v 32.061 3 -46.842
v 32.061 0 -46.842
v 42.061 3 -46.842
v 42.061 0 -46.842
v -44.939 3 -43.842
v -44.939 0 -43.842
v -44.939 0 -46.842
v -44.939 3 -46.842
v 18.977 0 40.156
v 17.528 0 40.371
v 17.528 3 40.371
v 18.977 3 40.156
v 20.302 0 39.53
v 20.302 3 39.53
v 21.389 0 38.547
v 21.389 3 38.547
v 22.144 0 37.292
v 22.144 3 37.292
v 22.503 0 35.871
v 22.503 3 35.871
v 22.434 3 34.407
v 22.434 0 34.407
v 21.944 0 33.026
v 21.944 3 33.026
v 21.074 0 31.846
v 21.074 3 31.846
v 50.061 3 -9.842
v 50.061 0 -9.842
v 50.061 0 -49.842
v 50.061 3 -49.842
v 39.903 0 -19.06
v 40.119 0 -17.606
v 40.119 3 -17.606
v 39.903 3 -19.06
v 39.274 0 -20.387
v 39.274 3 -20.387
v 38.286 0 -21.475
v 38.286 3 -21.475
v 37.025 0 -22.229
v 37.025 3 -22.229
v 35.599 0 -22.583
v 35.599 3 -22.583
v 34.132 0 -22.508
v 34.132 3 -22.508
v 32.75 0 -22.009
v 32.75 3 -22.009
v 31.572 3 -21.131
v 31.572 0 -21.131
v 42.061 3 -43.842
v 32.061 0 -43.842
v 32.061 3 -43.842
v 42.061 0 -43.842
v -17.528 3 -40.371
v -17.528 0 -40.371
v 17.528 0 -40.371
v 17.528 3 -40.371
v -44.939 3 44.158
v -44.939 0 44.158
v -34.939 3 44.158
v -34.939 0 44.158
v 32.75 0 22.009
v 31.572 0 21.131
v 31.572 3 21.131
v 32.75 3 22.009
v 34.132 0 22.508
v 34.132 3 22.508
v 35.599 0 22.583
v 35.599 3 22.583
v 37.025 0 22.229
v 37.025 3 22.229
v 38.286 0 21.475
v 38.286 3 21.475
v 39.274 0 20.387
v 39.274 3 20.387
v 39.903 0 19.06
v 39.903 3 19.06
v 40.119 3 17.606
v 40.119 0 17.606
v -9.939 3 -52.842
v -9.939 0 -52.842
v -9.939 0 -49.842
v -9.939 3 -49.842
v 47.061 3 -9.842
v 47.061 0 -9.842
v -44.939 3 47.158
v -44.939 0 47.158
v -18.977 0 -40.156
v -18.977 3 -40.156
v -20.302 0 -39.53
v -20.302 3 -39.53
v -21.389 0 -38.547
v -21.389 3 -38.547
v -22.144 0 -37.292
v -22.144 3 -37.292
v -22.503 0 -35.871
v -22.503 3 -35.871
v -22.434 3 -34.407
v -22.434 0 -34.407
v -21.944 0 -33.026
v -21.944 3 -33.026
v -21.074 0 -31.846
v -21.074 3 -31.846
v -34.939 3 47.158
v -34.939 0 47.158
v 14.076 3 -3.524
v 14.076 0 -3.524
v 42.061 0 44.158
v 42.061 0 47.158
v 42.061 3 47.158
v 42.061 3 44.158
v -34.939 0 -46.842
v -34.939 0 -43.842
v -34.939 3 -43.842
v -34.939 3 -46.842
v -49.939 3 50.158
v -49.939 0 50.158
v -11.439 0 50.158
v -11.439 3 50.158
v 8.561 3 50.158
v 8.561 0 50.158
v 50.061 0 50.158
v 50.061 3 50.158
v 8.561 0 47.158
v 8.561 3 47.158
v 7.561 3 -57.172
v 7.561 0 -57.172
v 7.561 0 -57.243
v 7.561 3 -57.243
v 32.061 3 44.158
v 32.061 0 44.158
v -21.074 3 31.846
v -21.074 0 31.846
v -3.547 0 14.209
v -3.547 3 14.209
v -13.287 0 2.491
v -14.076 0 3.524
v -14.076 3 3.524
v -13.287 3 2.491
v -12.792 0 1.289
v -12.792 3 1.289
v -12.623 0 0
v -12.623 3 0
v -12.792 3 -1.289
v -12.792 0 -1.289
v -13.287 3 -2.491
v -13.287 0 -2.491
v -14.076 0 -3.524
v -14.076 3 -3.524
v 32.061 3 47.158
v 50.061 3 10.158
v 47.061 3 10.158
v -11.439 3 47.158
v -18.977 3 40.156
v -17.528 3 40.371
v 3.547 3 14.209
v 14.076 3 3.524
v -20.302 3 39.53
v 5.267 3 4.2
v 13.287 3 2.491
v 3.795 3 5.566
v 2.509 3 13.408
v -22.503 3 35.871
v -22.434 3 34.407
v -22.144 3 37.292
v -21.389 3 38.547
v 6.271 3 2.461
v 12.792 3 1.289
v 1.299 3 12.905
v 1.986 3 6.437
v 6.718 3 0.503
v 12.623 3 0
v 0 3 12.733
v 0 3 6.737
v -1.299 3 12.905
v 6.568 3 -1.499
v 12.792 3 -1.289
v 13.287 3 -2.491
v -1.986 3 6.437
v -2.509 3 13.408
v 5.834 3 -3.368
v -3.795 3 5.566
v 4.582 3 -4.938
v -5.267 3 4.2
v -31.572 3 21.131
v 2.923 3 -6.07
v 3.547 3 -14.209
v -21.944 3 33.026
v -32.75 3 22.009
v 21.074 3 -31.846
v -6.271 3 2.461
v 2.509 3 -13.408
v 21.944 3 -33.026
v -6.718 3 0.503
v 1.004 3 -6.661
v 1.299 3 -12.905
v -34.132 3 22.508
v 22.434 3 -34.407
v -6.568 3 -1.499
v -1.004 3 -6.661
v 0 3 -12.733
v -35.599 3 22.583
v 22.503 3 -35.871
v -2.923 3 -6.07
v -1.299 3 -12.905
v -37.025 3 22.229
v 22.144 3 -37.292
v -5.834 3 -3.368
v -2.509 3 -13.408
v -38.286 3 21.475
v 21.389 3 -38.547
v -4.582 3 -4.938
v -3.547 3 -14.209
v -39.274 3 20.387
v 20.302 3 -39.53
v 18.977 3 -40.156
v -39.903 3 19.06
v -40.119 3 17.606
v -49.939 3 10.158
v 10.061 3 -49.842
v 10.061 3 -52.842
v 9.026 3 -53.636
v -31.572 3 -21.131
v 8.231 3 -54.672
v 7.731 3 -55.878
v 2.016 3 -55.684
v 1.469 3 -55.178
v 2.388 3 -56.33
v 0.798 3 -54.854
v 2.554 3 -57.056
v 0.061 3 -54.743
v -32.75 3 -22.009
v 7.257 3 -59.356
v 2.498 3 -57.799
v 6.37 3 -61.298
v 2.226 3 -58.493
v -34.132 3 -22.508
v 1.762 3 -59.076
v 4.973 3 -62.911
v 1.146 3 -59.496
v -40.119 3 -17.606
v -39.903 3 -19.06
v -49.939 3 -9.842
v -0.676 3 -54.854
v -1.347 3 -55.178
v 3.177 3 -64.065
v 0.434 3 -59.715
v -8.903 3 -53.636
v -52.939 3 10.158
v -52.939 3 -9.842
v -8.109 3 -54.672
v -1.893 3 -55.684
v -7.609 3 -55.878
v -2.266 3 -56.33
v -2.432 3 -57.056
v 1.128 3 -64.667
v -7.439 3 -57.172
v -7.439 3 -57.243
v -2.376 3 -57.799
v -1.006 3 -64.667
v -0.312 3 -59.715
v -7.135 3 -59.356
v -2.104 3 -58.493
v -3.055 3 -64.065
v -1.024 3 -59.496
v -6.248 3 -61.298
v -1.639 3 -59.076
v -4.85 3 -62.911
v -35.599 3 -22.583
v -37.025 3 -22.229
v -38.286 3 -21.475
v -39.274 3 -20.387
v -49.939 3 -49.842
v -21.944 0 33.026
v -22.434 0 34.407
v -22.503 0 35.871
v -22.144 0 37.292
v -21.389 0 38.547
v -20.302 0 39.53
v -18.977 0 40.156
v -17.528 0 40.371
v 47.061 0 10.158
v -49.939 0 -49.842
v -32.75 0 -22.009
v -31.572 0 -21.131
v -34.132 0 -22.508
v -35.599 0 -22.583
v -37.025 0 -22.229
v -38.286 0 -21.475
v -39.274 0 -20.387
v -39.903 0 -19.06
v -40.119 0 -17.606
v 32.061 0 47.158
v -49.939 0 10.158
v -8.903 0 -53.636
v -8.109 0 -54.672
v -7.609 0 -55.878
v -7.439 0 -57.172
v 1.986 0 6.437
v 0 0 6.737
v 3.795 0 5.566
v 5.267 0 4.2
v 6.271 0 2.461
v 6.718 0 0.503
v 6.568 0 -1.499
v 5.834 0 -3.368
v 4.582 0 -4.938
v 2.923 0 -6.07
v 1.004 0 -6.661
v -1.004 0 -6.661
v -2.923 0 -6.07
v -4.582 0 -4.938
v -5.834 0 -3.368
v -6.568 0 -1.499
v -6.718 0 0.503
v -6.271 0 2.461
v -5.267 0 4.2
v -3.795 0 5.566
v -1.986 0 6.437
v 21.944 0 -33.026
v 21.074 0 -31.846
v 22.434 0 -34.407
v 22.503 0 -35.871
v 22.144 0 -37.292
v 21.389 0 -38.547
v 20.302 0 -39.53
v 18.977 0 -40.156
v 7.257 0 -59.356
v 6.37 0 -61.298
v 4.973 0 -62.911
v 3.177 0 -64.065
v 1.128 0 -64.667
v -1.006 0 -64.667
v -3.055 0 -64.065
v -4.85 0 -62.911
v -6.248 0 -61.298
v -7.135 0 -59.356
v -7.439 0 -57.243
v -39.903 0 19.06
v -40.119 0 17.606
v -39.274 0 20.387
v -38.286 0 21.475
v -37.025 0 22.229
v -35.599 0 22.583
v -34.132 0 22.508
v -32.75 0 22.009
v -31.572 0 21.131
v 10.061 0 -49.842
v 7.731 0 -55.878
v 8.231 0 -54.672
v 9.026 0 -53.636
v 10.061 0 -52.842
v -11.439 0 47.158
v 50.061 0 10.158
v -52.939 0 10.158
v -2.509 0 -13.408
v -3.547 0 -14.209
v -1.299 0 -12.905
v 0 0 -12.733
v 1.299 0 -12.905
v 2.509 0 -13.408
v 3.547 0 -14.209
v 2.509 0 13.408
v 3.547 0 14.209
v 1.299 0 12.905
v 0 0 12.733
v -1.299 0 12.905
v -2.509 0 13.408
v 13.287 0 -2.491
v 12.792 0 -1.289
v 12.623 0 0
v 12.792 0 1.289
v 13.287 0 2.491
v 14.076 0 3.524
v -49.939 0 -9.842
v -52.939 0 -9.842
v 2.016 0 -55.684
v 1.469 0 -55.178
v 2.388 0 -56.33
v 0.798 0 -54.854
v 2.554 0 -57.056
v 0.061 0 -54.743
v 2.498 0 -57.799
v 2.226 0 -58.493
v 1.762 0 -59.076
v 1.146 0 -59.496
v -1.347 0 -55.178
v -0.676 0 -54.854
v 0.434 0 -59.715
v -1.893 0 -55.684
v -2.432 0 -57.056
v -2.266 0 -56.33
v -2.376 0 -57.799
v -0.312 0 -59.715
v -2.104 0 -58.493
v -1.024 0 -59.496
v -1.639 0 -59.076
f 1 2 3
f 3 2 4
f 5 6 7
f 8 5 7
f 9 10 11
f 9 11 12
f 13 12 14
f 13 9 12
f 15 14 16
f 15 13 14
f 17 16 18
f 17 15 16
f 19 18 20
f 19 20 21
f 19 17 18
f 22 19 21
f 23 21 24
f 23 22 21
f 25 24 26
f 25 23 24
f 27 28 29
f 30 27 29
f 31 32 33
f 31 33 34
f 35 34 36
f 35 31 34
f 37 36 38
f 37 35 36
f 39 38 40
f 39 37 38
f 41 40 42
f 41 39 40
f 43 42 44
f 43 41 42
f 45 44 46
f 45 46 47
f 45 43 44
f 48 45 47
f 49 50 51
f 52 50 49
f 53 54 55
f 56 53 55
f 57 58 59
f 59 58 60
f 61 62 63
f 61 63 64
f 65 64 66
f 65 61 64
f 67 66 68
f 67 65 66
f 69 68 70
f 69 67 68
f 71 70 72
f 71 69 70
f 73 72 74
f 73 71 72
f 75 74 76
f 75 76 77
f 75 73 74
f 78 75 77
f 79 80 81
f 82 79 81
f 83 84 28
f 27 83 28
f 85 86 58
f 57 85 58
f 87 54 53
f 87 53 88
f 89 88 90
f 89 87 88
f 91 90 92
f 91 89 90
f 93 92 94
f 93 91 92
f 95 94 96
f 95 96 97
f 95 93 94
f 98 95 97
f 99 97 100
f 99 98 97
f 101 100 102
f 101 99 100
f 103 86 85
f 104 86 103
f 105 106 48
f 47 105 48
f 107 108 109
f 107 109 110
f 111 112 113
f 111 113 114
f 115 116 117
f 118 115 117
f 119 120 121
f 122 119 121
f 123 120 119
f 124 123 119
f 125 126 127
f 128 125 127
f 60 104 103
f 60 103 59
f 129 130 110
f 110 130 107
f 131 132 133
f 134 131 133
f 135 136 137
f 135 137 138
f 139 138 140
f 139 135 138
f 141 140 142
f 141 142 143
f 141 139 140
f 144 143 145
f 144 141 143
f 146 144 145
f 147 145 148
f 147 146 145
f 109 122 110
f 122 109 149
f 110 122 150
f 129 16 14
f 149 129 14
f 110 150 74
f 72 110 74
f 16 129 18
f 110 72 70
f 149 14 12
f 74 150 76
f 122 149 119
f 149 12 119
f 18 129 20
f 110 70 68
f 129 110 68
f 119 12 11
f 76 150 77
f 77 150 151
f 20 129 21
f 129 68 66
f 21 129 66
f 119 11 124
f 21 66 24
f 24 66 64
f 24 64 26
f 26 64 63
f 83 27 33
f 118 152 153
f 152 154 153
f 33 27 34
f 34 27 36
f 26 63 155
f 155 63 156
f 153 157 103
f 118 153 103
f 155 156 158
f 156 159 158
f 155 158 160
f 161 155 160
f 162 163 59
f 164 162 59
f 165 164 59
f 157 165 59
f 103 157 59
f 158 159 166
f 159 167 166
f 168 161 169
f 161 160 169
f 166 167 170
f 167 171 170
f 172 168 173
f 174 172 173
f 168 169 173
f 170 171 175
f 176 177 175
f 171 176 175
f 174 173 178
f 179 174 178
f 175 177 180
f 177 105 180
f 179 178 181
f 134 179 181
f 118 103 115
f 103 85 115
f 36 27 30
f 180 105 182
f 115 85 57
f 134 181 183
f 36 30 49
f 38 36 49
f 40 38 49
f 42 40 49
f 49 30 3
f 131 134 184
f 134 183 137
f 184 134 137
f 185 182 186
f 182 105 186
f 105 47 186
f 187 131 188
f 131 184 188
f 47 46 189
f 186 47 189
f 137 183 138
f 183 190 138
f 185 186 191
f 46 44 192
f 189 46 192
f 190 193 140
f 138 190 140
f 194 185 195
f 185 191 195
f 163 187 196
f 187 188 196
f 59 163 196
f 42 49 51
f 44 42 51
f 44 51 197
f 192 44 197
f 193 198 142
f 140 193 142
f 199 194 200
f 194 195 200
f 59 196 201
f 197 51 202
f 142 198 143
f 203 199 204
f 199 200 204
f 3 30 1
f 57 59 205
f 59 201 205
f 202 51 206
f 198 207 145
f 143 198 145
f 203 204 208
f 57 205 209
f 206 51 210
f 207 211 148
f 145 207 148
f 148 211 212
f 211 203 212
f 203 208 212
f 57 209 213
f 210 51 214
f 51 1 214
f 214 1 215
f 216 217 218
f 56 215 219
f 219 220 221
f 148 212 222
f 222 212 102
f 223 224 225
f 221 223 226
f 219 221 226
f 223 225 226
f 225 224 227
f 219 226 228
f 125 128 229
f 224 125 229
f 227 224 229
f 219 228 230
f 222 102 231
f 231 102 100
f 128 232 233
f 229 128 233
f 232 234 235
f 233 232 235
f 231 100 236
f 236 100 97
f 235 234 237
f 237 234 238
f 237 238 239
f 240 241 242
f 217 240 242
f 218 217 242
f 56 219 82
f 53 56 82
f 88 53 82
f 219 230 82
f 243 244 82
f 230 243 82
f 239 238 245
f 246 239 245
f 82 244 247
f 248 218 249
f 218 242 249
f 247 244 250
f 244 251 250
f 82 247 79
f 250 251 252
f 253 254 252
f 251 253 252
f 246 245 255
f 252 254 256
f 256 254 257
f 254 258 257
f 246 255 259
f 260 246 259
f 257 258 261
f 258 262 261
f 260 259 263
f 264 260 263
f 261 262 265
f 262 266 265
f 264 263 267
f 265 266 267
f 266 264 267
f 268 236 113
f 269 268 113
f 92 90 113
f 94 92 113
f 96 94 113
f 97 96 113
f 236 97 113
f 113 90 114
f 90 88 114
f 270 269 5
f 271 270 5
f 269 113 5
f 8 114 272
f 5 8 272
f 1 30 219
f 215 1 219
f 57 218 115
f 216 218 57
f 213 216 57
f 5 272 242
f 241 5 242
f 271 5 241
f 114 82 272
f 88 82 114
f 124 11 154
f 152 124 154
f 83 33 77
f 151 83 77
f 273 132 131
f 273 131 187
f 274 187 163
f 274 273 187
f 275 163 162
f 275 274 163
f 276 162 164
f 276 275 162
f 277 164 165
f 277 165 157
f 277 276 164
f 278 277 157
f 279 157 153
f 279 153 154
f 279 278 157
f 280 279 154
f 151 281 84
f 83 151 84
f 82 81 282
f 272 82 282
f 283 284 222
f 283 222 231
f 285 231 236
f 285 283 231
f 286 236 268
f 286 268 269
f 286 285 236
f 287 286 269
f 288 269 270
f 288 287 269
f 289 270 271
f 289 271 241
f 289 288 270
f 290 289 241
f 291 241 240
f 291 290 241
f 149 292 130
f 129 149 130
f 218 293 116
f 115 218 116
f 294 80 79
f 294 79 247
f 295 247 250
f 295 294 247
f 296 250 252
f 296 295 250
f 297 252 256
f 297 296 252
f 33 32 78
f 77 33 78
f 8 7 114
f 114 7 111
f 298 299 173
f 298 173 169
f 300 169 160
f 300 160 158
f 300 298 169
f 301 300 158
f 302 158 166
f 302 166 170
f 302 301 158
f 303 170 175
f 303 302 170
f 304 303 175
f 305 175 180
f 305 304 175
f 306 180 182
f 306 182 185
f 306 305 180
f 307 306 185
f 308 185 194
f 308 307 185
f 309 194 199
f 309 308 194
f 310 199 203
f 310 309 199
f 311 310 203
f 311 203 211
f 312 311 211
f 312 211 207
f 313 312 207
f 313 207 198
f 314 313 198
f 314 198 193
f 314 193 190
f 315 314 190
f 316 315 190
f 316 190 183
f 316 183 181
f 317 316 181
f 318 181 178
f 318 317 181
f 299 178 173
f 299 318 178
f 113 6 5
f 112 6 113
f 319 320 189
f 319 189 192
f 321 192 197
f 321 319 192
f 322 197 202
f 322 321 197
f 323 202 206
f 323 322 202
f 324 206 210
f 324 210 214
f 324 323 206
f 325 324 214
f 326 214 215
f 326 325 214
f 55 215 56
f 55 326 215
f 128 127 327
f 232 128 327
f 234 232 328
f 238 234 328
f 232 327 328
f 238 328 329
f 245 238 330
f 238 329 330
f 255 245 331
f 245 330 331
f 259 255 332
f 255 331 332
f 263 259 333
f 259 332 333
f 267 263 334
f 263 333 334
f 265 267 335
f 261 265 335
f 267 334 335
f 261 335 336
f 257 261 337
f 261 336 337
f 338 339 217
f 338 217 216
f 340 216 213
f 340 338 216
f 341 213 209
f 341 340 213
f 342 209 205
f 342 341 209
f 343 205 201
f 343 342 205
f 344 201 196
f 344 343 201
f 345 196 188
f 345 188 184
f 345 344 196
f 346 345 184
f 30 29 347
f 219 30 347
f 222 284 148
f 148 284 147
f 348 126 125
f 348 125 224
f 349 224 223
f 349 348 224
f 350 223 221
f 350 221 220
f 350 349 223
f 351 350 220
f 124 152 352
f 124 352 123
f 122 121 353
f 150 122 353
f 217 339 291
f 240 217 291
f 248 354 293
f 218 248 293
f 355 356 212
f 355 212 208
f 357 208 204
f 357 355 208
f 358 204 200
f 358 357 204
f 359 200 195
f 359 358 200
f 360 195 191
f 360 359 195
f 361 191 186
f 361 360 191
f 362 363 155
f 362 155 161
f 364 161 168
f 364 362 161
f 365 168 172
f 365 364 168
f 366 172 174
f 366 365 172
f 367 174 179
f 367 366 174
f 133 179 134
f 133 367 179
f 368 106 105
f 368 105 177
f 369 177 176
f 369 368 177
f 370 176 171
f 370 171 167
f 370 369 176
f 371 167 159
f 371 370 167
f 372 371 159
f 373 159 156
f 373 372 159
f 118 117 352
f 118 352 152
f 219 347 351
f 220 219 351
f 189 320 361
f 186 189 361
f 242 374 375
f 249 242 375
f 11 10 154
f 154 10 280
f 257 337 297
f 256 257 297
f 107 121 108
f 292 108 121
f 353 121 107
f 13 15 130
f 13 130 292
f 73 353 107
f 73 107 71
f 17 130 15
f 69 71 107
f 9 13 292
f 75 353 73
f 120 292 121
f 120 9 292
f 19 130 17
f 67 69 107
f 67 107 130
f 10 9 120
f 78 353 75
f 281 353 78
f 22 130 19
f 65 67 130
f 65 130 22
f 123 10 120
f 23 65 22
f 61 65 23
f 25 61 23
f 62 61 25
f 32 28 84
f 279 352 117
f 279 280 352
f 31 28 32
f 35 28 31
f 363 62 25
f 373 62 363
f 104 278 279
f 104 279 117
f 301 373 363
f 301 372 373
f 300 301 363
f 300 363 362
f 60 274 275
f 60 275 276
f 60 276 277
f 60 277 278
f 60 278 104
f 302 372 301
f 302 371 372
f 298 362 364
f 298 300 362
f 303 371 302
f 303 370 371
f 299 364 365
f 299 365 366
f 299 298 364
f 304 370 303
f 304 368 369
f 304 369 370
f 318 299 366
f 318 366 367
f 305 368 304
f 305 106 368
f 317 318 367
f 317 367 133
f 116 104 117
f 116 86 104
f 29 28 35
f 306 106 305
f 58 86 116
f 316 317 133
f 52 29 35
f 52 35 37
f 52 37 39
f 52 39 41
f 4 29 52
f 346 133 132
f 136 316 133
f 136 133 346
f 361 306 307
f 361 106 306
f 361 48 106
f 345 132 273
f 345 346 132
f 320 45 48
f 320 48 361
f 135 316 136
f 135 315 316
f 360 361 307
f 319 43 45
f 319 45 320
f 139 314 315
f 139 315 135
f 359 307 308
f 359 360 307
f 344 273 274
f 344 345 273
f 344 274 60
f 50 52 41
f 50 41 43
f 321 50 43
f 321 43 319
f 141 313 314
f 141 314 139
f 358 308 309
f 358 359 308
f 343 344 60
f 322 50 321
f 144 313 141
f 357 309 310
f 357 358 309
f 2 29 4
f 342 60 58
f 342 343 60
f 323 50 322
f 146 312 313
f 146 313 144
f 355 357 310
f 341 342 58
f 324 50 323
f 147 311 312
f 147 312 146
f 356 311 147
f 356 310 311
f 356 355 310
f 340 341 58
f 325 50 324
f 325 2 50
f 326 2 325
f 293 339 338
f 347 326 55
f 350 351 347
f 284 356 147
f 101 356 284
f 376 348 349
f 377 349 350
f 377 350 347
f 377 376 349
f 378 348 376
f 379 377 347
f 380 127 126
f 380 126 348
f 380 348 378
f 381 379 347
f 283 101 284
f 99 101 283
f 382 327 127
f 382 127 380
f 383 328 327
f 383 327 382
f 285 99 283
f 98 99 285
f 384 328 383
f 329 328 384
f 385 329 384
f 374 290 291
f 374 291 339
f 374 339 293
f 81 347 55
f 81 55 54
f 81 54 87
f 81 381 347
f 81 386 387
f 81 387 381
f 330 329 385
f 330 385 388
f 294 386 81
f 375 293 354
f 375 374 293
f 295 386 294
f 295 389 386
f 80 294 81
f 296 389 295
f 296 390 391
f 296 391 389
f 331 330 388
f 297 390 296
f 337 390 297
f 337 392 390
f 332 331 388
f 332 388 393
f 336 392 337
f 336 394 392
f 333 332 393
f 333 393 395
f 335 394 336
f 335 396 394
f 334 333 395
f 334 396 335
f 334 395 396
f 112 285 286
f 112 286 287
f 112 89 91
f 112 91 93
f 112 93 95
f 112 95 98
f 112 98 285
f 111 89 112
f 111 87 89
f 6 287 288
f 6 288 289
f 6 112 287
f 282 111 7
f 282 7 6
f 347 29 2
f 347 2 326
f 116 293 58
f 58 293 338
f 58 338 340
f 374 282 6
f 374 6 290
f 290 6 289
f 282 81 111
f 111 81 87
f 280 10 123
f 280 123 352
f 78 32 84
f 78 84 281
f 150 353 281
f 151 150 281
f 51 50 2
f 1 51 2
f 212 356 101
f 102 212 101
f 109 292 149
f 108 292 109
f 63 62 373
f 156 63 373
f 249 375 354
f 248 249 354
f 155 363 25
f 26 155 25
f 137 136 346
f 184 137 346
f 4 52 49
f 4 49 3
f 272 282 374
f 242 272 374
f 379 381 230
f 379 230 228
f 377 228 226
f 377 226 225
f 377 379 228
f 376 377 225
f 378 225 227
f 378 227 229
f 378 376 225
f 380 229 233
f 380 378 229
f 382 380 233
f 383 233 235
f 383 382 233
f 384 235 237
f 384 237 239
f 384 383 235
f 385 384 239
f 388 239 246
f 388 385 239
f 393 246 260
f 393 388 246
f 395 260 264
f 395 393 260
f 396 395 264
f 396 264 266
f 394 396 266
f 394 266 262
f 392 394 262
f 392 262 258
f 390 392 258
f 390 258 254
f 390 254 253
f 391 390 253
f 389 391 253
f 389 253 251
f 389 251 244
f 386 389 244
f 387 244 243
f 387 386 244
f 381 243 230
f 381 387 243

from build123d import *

# Parameters (mm, degrees)
SKETCH1_R           = 6.736700536
SKETCH1_W           = 10
SKETCH1_H           = 3
SKETCH1_R_2         = 2.5
BOSS_EXTRUDE1_DEPTH = 3
FILLET1_R           = 5
SKETCH5_W           = 20
SKETCH5_H           = 3
CUT_EXTRUDE1_DEPTH  = 3


with BuildPart() as part:
    # Sketch1 → Boss-Extrude1 (new body)
    with BuildSketch(Plane(origin=(0, 0, 0), x_dir=(1, 0, 0), z_dir=(0, 1, 0))):
        with BuildLine():
            Line((-49.938910977, -10.158402567), (-49.938910977, -50.158402567))
            Line((-49.938910977, -50.158402567), (50.061089023, -50.158402567))
            Line((50.061089023, -50.158402567), (50.061089023, -10.158402567))
            Line((50.061089023, -10.158402567), (47.061089023, -10.158402567))
            Line((47.061089023, -10.158402567), (47.061089023, 9.841597433))
            Line((47.061089023, 9.841597433), (50.061089023, 9.841597433))
            Line((50.061089023, 9.841597433), (50.061089023, 49.841597433))
            Line((50.061089023, 49.841597433), (10.061089023, 49.841597433))
            Line((10.061089023, 49.841597433), (10.061089023, 52.841597433))
            Line((10.061089023, 52.841597433), (7.561089023, 52.841597433))
            Line((7.561089023, 52.841597433), (7.561089023, 57.243104586))
            ThreePointArc((7.561089023, 57.243104586), (0.061089023, 64.743104586), (-7.438910977, 57.243104586))
            Line((-7.438910977, 57.243104586), (-7.438910977, 52.841597433))
            Line((-7.438910977, 52.841597433), (-9.938910977, 52.841597433))
            Line((-9.938910977, 52.841597433), (-9.938910977, 49.841597433))
            Line((-9.938910977, 49.841597433), (-49.938910977, 49.841597433))
            Line((-49.938910977, 49.841597433), (-49.938910977, 9.841597433))
            Line((-49.938910977, 9.841597433), (-52.938910977, 9.841597433))
            Line((-52.938910977, 9.841597433), (-52.938910977, -10.158402567))
            Line((-52.938910977, -10.158402567), (-49.938910977, -10.158402567))
        make_face()
        Polygon((-40.119028072, -29.730929333), (-40.119028072, 29.730929333), (-10.573569788, 0), align=None, mode=Mode.SUBTRACT)
        Polygon((-29.545458284, 40.370874503), (29.545458284, 40.370874503), (0, 10.63994517), align=None, mode=Mode.SUBTRACT)
        Polygon((40.119028072, 29.730929333), (40.119028072, -29.730929333), (10.573569788, 0), align=None, mode=Mode.SUBTRACT)
        Polygon((29.545458284, -40.370874503), (-29.545458284, -40.370874503), (0, -10.63994517), align=None, mode=Mode.SUBTRACT)
        with Locations(Location((0, 0, 0), (0, 0, 270))):
            Circle(SKETCH1_R, mode=Mode.SUBTRACT)
        with Locations((-39.938910977, -45.658402567)):
            Rectangle(SKETCH1_W, SKETCH1_H, mode=Mode.SUBTRACT)
        with Locations((37.061089023, -45.658402567)):
            Rectangle(SKETCH1_W, SKETCH1_H, mode=Mode.SUBTRACT)
        with Locations((-39.938910977, 45.341597433)):
            Rectangle(SKETCH1_W, SKETCH1_H, mode=Mode.SUBTRACT)
        with Locations(Location((0.061089023, 57.243104586, 0), (0, 0, 270))):
            Circle(SKETCH1_R_2, mode=Mode.SUBTRACT)
        with Locations((37.061089023, 45.341597433)):
            Rectangle(SKETCH1_W, SKETCH1_H, mode=Mode.SUBTRACT)
    extrude(amount=BOSS_EXTRUDE1_DEPTH)

    # Fillet1
    # the kernel refuses this fillet: 5 mm, written as the material it adds along each edge
    with BuildSketch(Plane(origin=(7.561089023, 0, -52.841597433), x_dir=(1, 0, 0), z_dir=(0, 1, 0))) as fillet1_piece_1:
        with BuildLine():
            CenterArc((5, 4.330127019), FILLET1_R, 180, 60)
            Line((0, 4.330127019), (-0.1, 4.330127019))
            Line((-0.1, 4.330127019), (-0.1, 0))
            Line((-0.1, 0), (0, -0.1))
            ThreePointArc((0, -0.1), (1.25, -0.1), (2.45, -0.08660254))
            Line((2.45, -0.08660254), (2.5, 0))
        make_face()
    extrude(amount=3)
    # the kernel refuses this fillet: 5 mm, written as the material it adds along each edge
    with BuildSketch(Plane(origin=(-7.438910977, 0, -52.841597433), x_dir=(-1, 0, 0), z_dir=(0, 1, 0))) as fillet1_2_piece_1:
        with BuildLine():
            CenterArc((5, -4.330127019), FILLET1_R, 120, 60)
            Line((0, -4.330127019), (-0.1, -4.330127019))
            Line((-0.1, -4.330127019), (-0.1, 0))
            Line((-0.1, 0), (0, 0.1))
            ThreePointArc((0, 0.1), (1.25, 0.1), (2.45, 0.08660254))
            Line((2.45, 0.08660254), (2.5, 0))
        make_face()
    extrude(amount=3)
    # the kernel refuses this fillet: 5 mm, written as the material it adds along each edge
    with BuildSketch(Plane(origin=(-10.573569788, 0, 0), x_dir=(-0.7048908504671988, 0, 0.7093157892840319), z_dir=(0, 1, 0))) as fillet1_3_piece_1:
        with BuildLine():
            CenterArc((FILLET1_R * 0.993761680081, -FILLET1_R), FILLET1_R, 90, 89.6414534)
            Line((-FILLET1_R * 0.00621873983502, -FILLET1_R * 0.993742222145), (-FILLET1_R * 0.0262183482333, -FILLET1_R * 0.993617066588))
            Line((-FILLET1_R * 0.0262183482333, -FILLET1_R * 0.993617066588), (-FILLET1_R * 0.0198752336016, FILLET1_R * 0.02))
            Line((-FILLET1_R * 0.0198752336016, FILLET1_R * 0.02), (FILLET1_R * 0.993761680081, FILLET1_R * 0.02))
            Line((FILLET1_R * 0.993761680081, FILLET1_R * 0.02), (FILLET1_R * 0.993761680081, 0))
        make_face()
    extrude(amount=3)
    # the kernel refuses this fillet: 5 mm, written as the material it adds along each edge
    with BuildSketch(Plane(origin=(-40.119028072, 0, 29.730929333), x_dir=(0, 0, -1), z_dir=(0, 1, 0))) as fillet1_4_piece_1:
        with BuildLine():
            CenterArc((FILLET1_R * 2.42493683689, -FILLET1_R), FILLET1_R, 90, 135.1792733)
            Line((FILLET1_R * 1.72004598642, -FILLET1_R * 1.70931578928), (FILLET1_R * 1.70594816941, -FILLET1_R * 1.72350210507))
            Line((FILLET1_R * 1.70594816941, -FILLET1_R * 1.72350210507), (-FILLET1_R * 0.0140978170093, -FILLET1_R * 0.0141863157857))
            Line((-FILLET1_R * 0.0140978170093, -FILLET1_R * 0.0141863157857), (0, FILLET1_R * 0.02))
            Line((0, FILLET1_R * 0.02), (FILLET1_R * 2.42493683689, FILLET1_R * 0.02))
            Line((FILLET1_R * 2.42493683689, FILLET1_R * 0.02), (FILLET1_R * 2.42493683689, 0))
        make_face()
    extrude(amount=3)
    # the kernel refuses this fillet: 5 mm, written as the material it adds along each edge
    with BuildSketch(Plane(origin=(-40.119028072, 0, -29.730929333), x_dir=(0, 0, 1), z_dir=(0, 1, 0))) as fillet1_5_piece_1:
        with BuildLine():
            CenterArc((FILLET1_R * 2.42493683689, FILLET1_R), FILLET1_R, 134.8207267, 135.1792733)
            Line((FILLET1_R * 1.72004598642, FILLET1_R * 1.70931578928), (FILLET1_R * 1.70594816941, FILLET1_R * 1.72350210507))
            Line((FILLET1_R * 1.70594816941, FILLET1_R * 1.72350210507), (-FILLET1_R * 0.0140978170093, FILLET1_R * 0.0141863157857))
            Line((-FILLET1_R * 0.0140978170093, FILLET1_R * 0.0141863157857), (0, -FILLET1_R * 0.02))
            Line((0, -FILLET1_R * 0.02), (FILLET1_R * 2.42493683689, -FILLET1_R * 0.02))
            Line((FILLET1_R * 2.42493683689, -FILLET1_R * 0.02), (FILLET1_R * 2.42493683689, 0))
        make_face()
    extrude(amount=3)
    # the kernel refuses this fillet: 5 mm, written as the material it adds along each edge
    with BuildSketch(Plane(origin=(-29.545458284, 0, -40.370874503), x_dir=(1, 0, 0), z_dir=(0, 1, 0))) as fillet1_6_piece_1:
        with BuildLine():
            CenterArc((FILLET1_R * 2.4035709852, -FILLET1_R), FILLET1_R, 90, 134.8207267)
            Line((FILLET1_R * 1.69425519592, -FILLET1_R * 1.70489085047), (FILLET1_R * 1.68006888013, -FILLET1_R * 1.71898866748))
            Line((FILLET1_R * 1.68006888013, -FILLET1_R * 1.71898866748), (-FILLET1_R * 0.0141863157857, -FILLET1_R * 0.0140978170093))
            Line((-FILLET1_R * 0.0141863157857, -FILLET1_R * 0.0140978170093), (0, FILLET1_R * 0.02))
            Line((0, FILLET1_R * 0.02), (FILLET1_R * 2.4035709852, FILLET1_R * 0.02))
            Line((FILLET1_R * 2.4035709852, FILLET1_R * 0.02), (FILLET1_R * 2.4035709852, 0))
        make_face()
    extrude(amount=3)
    # the kernel refuses this fillet: 5 mm, written as the material it adds along each edge
    with BuildSketch(Plane(origin=(29.545458284, 0, -40.370874503), x_dir=(-0.7048908504671981, 0, 0.7093157892840325), z_dir=(0, 1, 0))) as fillet1_7_piece_1:
        with BuildLine():
            CenterArc((FILLET1_R * 2.4035709852, -FILLET1_R), FILLET1_R, 90, 134.8207267)
            Line((FILLET1_R * 1.69425519592, -FILLET1_R * 1.70489085047), (FILLET1_R * 1.68006888013, -FILLET1_R * 1.71898866748))
            Line((FILLET1_R * 1.68006888013, -FILLET1_R * 1.71898866748), (-FILLET1_R * 0.0141863157857, -FILLET1_R * 0.0140978170093))
            Line((-FILLET1_R * 0.0141863157857, -FILLET1_R * 0.0140978170093), (0, FILLET1_R * 0.02))
            Line((0, FILLET1_R * 0.02), (FILLET1_R * 2.4035709852, FILLET1_R * 0.02))
            Line((FILLET1_R * 2.4035709852, FILLET1_R * 0.02), (FILLET1_R * 2.4035709852, 0))
        make_face()
    extrude(amount=3)
    # the kernel refuses this fillet: 5 mm, written as the material it adds along each edge
    with BuildSketch(Plane(origin=(0, 0, -10.63994517), x_dir=(0.7048908504671987, 0, -0.7093157892840322), z_dir=(0, 1, 0))) as fillet1_8_piece_1:
        with BuildLine():
            CenterArc((FILLET1_R * 1.00627748085, FILLET1_R), FILLET1_R, 179.6414534, 90.3585466)
            Line((FILLET1_R * 0.00629706093592, FILLET1_R * 1.00625777786), (-FILLET1_R * 0.0137025474624, FILLET1_R * 1.00638293341))
            Line((-FILLET1_R * 0.0137025474624, FILLET1_R * 1.00638293341), (-FILLET1_R * 0.020125549617, -FILLET1_R * 0.02))
            Line((-FILLET1_R * 0.020125549617, -FILLET1_R * 0.02), (FILLET1_R * 1.00627748085, -FILLET1_R * 0.02))
            Line((FILLET1_R * 1.00627748085, -FILLET1_R * 0.02), (FILLET1_R * 1.00627748085, 0))
        make_face()
    extrude(amount=3)
    # the kernel refuses this fillet: 5 mm, written as the material it adds along each edge
    with BuildSketch(Plane(origin=(40.119028072, 0, -29.730929333), x_dir=(0, 0, 1), z_dir=(0, 1, 0))) as fillet1_9_piece_1:
        with BuildLine():
            CenterArc((FILLET1_R * 2.42493683689, -FILLET1_R), FILLET1_R, 90, 135.1792733)
            Line((FILLET1_R * 1.72004598642, -FILLET1_R * 1.70931578928), (FILLET1_R * 1.70594816941, -FILLET1_R * 1.72350210507))
            Line((FILLET1_R * 1.70594816941, -FILLET1_R * 1.72350210507), (-FILLET1_R * 0.0140978170093, -FILLET1_R * 0.0141863157857))
            Line((-FILLET1_R * 0.0140978170093, -FILLET1_R * 0.0141863157857), (0, FILLET1_R * 0.02))
            Line((0, FILLET1_R * 0.02), (FILLET1_R * 2.42493683689, FILLET1_R * 0.02))
            Line((FILLET1_R * 2.42493683689, FILLET1_R * 0.02), (FILLET1_R * 2.42493683689, 0))
        make_face()
    extrude(amount=3)
    # the kernel refuses this fillet: 5 mm, written as the material it adds along each edge
    with BuildSketch(Plane(origin=(40.119028072, 0, 29.730929333), x_dir=(-0.7048908504671988, 0, -0.7093157892840319), z_dir=(0, 1, 0))) as fillet1_10_piece_1:
        with BuildLine():
            CenterArc((FILLET1_R * 2.42493683689, -FILLET1_R), FILLET1_R, 90, 135.1792733)
            Line((FILLET1_R * 1.72004598642, -FILLET1_R * 1.70931578928), (FILLET1_R * 1.70594816941, -FILLET1_R * 1.72350210507))
            Line((FILLET1_R * 1.70594816941, -FILLET1_R * 1.72350210507), (-FILLET1_R * 0.0140978170093, -FILLET1_R * 0.0141863157857))
            Line((-FILLET1_R * 0.0140978170093, -FILLET1_R * 0.0141863157857), (0, FILLET1_R * 0.02))
            Line((0, FILLET1_R * 0.02), (FILLET1_R * 2.42493683689, FILLET1_R * 0.02))
            Line((FILLET1_R * 2.42493683689, FILLET1_R * 0.02), (FILLET1_R * 2.42493683689, 0))
        make_face()
    extrude(amount=3)
    # the kernel refuses this fillet: 5 mm, written as the material it adds along each edge
    with BuildSketch(Plane(origin=(10.573569788, 0, 0), x_dir=(0.7048908504671986, 0, 0.7093157892840322), z_dir=(0, 1, 0))) as fillet1_11_piece_1:
        with BuildLine():
            CenterArc((FILLET1_R * 0.993761680081, FILLET1_R), FILLET1_R, 180.3585466, 89.6414534)
            Line((-FILLET1_R * 0.00621873983502, FILLET1_R * 0.993742222145), (-FILLET1_R * 0.0262183482333, FILLET1_R * 0.993617066588))
            Line((-FILLET1_R * 0.0262183482333, FILLET1_R * 0.993617066588), (-FILLET1_R * 0.0198752336016, -FILLET1_R * 0.02))
            Line((-FILLET1_R * 0.0198752336016, -FILLET1_R * 0.02), (FILLET1_R * 0.993761680081, -FILLET1_R * 0.02))
            Line((FILLET1_R * 0.993761680081, -FILLET1_R * 0.02), (FILLET1_R * 0.993761680081, 0))
        make_face()
    extrude(amount=3)
    # the kernel refuses this fillet: 5 mm, written as the material it adds along each edge
    with BuildSketch(Plane(origin=(0, 0, 10.63994517), x_dir=(0.7048908504671988, 0, 0.709315789284032), z_dir=(0, 1, 0))) as fillet1_12_piece_1:
        with BuildLine():
            CenterArc((FILLET1_R * 1.00627748085, -FILLET1_R), FILLET1_R, 90, 90.3585466)
            Line((FILLET1_R * 0.00629706093592, -FILLET1_R * 1.00625777786), (-FILLET1_R * 0.0137025474624, -FILLET1_R * 1.00638293341))
            Line((-FILLET1_R * 0.0137025474624, -FILLET1_R * 1.00638293341), (-FILLET1_R * 0.020125549617, FILLET1_R * 0.02))
            Line((-FILLET1_R * 0.020125549617, FILLET1_R * 0.02), (FILLET1_R * 1.00627748085, FILLET1_R * 0.02))
            Line((FILLET1_R * 1.00627748085, FILLET1_R * 0.02), (FILLET1_R * 1.00627748085, 0))
        make_face()
    extrude(amount=3)
    # the kernel refuses this fillet: 5 mm, written as the material it adds along each edge
    with BuildSketch(Plane(origin=(29.545458284, 0, 40.370874503), x_dir=(-1, 0, 0), z_dir=(0, 1, 0))) as fillet1_13_piece_1:
        with BuildLine():
            CenterArc((FILLET1_R * 2.4035709852, -FILLET1_R), FILLET1_R, 90, 134.8207267)
            Line((FILLET1_R * 1.69425519592, -FILLET1_R * 1.70489085047), (FILLET1_R * 1.68006888013, -FILLET1_R * 1.71898866748))
            Line((FILLET1_R * 1.68006888013, -FILLET1_R * 1.71898866748), (-FILLET1_R * 0.0141863157857, -FILLET1_R * 0.0140978170093))
            Line((-FILLET1_R * 0.0141863157857, -FILLET1_R * 0.0140978170093), (0, FILLET1_R * 0.02))
            Line((0, FILLET1_R * 0.02), (FILLET1_R * 2.4035709852, FILLET1_R * 0.02))
            Line((FILLET1_R * 2.4035709852, FILLET1_R * 0.02), (FILLET1_R * 2.4035709852, 0))
        make_face()
    extrude(amount=3)
    # the kernel refuses this fillet: 5 mm, written as the material it adds along each edge
    with BuildSketch(Plane(origin=(-29.545458284, 0, 40.370874503), x_dir=(1, 0, 0), z_dir=(0, 1, 0))) as fillet1_14_piece_1:
        with BuildLine():
            CenterArc((FILLET1_R * 2.4035709852, FILLET1_R), FILLET1_R, 135.1792733, 134.8207267)
            Line((FILLET1_R * 1.69425519592, FILLET1_R * 1.70489085047), (FILLET1_R * 1.68006888013, FILLET1_R * 1.71898866748))
            Line((FILLET1_R * 1.68006888013, FILLET1_R * 1.71898866748), (-FILLET1_R * 0.0141863157857, FILLET1_R * 0.0140978170093))
            Line((-FILLET1_R * 0.0141863157857, FILLET1_R * 0.0140978170093), (0, -FILLET1_R * 0.02))
            Line((0, -FILLET1_R * 0.02), (FILLET1_R * 2.4035709852, -FILLET1_R * 0.02))
            Line((FILLET1_R * 2.4035709852, -FILLET1_R * 0.02), (FILLET1_R * 2.4035709852, 0))
        make_face()
    extrude(amount=3)

    # Sketch5 → Cut-Extrude1 (cut)
    with BuildSketch(Plane.XY.offset(50.158402567)):
        with Locations((-1.438910977, 1.5)):
            Rectangle(SKETCH5_W, SKETCH5_H)
    extrude(amount=-CUT_EXTRUDE1_DEPTH, mode=Mode.SUBTRACT)


solid = part.part
